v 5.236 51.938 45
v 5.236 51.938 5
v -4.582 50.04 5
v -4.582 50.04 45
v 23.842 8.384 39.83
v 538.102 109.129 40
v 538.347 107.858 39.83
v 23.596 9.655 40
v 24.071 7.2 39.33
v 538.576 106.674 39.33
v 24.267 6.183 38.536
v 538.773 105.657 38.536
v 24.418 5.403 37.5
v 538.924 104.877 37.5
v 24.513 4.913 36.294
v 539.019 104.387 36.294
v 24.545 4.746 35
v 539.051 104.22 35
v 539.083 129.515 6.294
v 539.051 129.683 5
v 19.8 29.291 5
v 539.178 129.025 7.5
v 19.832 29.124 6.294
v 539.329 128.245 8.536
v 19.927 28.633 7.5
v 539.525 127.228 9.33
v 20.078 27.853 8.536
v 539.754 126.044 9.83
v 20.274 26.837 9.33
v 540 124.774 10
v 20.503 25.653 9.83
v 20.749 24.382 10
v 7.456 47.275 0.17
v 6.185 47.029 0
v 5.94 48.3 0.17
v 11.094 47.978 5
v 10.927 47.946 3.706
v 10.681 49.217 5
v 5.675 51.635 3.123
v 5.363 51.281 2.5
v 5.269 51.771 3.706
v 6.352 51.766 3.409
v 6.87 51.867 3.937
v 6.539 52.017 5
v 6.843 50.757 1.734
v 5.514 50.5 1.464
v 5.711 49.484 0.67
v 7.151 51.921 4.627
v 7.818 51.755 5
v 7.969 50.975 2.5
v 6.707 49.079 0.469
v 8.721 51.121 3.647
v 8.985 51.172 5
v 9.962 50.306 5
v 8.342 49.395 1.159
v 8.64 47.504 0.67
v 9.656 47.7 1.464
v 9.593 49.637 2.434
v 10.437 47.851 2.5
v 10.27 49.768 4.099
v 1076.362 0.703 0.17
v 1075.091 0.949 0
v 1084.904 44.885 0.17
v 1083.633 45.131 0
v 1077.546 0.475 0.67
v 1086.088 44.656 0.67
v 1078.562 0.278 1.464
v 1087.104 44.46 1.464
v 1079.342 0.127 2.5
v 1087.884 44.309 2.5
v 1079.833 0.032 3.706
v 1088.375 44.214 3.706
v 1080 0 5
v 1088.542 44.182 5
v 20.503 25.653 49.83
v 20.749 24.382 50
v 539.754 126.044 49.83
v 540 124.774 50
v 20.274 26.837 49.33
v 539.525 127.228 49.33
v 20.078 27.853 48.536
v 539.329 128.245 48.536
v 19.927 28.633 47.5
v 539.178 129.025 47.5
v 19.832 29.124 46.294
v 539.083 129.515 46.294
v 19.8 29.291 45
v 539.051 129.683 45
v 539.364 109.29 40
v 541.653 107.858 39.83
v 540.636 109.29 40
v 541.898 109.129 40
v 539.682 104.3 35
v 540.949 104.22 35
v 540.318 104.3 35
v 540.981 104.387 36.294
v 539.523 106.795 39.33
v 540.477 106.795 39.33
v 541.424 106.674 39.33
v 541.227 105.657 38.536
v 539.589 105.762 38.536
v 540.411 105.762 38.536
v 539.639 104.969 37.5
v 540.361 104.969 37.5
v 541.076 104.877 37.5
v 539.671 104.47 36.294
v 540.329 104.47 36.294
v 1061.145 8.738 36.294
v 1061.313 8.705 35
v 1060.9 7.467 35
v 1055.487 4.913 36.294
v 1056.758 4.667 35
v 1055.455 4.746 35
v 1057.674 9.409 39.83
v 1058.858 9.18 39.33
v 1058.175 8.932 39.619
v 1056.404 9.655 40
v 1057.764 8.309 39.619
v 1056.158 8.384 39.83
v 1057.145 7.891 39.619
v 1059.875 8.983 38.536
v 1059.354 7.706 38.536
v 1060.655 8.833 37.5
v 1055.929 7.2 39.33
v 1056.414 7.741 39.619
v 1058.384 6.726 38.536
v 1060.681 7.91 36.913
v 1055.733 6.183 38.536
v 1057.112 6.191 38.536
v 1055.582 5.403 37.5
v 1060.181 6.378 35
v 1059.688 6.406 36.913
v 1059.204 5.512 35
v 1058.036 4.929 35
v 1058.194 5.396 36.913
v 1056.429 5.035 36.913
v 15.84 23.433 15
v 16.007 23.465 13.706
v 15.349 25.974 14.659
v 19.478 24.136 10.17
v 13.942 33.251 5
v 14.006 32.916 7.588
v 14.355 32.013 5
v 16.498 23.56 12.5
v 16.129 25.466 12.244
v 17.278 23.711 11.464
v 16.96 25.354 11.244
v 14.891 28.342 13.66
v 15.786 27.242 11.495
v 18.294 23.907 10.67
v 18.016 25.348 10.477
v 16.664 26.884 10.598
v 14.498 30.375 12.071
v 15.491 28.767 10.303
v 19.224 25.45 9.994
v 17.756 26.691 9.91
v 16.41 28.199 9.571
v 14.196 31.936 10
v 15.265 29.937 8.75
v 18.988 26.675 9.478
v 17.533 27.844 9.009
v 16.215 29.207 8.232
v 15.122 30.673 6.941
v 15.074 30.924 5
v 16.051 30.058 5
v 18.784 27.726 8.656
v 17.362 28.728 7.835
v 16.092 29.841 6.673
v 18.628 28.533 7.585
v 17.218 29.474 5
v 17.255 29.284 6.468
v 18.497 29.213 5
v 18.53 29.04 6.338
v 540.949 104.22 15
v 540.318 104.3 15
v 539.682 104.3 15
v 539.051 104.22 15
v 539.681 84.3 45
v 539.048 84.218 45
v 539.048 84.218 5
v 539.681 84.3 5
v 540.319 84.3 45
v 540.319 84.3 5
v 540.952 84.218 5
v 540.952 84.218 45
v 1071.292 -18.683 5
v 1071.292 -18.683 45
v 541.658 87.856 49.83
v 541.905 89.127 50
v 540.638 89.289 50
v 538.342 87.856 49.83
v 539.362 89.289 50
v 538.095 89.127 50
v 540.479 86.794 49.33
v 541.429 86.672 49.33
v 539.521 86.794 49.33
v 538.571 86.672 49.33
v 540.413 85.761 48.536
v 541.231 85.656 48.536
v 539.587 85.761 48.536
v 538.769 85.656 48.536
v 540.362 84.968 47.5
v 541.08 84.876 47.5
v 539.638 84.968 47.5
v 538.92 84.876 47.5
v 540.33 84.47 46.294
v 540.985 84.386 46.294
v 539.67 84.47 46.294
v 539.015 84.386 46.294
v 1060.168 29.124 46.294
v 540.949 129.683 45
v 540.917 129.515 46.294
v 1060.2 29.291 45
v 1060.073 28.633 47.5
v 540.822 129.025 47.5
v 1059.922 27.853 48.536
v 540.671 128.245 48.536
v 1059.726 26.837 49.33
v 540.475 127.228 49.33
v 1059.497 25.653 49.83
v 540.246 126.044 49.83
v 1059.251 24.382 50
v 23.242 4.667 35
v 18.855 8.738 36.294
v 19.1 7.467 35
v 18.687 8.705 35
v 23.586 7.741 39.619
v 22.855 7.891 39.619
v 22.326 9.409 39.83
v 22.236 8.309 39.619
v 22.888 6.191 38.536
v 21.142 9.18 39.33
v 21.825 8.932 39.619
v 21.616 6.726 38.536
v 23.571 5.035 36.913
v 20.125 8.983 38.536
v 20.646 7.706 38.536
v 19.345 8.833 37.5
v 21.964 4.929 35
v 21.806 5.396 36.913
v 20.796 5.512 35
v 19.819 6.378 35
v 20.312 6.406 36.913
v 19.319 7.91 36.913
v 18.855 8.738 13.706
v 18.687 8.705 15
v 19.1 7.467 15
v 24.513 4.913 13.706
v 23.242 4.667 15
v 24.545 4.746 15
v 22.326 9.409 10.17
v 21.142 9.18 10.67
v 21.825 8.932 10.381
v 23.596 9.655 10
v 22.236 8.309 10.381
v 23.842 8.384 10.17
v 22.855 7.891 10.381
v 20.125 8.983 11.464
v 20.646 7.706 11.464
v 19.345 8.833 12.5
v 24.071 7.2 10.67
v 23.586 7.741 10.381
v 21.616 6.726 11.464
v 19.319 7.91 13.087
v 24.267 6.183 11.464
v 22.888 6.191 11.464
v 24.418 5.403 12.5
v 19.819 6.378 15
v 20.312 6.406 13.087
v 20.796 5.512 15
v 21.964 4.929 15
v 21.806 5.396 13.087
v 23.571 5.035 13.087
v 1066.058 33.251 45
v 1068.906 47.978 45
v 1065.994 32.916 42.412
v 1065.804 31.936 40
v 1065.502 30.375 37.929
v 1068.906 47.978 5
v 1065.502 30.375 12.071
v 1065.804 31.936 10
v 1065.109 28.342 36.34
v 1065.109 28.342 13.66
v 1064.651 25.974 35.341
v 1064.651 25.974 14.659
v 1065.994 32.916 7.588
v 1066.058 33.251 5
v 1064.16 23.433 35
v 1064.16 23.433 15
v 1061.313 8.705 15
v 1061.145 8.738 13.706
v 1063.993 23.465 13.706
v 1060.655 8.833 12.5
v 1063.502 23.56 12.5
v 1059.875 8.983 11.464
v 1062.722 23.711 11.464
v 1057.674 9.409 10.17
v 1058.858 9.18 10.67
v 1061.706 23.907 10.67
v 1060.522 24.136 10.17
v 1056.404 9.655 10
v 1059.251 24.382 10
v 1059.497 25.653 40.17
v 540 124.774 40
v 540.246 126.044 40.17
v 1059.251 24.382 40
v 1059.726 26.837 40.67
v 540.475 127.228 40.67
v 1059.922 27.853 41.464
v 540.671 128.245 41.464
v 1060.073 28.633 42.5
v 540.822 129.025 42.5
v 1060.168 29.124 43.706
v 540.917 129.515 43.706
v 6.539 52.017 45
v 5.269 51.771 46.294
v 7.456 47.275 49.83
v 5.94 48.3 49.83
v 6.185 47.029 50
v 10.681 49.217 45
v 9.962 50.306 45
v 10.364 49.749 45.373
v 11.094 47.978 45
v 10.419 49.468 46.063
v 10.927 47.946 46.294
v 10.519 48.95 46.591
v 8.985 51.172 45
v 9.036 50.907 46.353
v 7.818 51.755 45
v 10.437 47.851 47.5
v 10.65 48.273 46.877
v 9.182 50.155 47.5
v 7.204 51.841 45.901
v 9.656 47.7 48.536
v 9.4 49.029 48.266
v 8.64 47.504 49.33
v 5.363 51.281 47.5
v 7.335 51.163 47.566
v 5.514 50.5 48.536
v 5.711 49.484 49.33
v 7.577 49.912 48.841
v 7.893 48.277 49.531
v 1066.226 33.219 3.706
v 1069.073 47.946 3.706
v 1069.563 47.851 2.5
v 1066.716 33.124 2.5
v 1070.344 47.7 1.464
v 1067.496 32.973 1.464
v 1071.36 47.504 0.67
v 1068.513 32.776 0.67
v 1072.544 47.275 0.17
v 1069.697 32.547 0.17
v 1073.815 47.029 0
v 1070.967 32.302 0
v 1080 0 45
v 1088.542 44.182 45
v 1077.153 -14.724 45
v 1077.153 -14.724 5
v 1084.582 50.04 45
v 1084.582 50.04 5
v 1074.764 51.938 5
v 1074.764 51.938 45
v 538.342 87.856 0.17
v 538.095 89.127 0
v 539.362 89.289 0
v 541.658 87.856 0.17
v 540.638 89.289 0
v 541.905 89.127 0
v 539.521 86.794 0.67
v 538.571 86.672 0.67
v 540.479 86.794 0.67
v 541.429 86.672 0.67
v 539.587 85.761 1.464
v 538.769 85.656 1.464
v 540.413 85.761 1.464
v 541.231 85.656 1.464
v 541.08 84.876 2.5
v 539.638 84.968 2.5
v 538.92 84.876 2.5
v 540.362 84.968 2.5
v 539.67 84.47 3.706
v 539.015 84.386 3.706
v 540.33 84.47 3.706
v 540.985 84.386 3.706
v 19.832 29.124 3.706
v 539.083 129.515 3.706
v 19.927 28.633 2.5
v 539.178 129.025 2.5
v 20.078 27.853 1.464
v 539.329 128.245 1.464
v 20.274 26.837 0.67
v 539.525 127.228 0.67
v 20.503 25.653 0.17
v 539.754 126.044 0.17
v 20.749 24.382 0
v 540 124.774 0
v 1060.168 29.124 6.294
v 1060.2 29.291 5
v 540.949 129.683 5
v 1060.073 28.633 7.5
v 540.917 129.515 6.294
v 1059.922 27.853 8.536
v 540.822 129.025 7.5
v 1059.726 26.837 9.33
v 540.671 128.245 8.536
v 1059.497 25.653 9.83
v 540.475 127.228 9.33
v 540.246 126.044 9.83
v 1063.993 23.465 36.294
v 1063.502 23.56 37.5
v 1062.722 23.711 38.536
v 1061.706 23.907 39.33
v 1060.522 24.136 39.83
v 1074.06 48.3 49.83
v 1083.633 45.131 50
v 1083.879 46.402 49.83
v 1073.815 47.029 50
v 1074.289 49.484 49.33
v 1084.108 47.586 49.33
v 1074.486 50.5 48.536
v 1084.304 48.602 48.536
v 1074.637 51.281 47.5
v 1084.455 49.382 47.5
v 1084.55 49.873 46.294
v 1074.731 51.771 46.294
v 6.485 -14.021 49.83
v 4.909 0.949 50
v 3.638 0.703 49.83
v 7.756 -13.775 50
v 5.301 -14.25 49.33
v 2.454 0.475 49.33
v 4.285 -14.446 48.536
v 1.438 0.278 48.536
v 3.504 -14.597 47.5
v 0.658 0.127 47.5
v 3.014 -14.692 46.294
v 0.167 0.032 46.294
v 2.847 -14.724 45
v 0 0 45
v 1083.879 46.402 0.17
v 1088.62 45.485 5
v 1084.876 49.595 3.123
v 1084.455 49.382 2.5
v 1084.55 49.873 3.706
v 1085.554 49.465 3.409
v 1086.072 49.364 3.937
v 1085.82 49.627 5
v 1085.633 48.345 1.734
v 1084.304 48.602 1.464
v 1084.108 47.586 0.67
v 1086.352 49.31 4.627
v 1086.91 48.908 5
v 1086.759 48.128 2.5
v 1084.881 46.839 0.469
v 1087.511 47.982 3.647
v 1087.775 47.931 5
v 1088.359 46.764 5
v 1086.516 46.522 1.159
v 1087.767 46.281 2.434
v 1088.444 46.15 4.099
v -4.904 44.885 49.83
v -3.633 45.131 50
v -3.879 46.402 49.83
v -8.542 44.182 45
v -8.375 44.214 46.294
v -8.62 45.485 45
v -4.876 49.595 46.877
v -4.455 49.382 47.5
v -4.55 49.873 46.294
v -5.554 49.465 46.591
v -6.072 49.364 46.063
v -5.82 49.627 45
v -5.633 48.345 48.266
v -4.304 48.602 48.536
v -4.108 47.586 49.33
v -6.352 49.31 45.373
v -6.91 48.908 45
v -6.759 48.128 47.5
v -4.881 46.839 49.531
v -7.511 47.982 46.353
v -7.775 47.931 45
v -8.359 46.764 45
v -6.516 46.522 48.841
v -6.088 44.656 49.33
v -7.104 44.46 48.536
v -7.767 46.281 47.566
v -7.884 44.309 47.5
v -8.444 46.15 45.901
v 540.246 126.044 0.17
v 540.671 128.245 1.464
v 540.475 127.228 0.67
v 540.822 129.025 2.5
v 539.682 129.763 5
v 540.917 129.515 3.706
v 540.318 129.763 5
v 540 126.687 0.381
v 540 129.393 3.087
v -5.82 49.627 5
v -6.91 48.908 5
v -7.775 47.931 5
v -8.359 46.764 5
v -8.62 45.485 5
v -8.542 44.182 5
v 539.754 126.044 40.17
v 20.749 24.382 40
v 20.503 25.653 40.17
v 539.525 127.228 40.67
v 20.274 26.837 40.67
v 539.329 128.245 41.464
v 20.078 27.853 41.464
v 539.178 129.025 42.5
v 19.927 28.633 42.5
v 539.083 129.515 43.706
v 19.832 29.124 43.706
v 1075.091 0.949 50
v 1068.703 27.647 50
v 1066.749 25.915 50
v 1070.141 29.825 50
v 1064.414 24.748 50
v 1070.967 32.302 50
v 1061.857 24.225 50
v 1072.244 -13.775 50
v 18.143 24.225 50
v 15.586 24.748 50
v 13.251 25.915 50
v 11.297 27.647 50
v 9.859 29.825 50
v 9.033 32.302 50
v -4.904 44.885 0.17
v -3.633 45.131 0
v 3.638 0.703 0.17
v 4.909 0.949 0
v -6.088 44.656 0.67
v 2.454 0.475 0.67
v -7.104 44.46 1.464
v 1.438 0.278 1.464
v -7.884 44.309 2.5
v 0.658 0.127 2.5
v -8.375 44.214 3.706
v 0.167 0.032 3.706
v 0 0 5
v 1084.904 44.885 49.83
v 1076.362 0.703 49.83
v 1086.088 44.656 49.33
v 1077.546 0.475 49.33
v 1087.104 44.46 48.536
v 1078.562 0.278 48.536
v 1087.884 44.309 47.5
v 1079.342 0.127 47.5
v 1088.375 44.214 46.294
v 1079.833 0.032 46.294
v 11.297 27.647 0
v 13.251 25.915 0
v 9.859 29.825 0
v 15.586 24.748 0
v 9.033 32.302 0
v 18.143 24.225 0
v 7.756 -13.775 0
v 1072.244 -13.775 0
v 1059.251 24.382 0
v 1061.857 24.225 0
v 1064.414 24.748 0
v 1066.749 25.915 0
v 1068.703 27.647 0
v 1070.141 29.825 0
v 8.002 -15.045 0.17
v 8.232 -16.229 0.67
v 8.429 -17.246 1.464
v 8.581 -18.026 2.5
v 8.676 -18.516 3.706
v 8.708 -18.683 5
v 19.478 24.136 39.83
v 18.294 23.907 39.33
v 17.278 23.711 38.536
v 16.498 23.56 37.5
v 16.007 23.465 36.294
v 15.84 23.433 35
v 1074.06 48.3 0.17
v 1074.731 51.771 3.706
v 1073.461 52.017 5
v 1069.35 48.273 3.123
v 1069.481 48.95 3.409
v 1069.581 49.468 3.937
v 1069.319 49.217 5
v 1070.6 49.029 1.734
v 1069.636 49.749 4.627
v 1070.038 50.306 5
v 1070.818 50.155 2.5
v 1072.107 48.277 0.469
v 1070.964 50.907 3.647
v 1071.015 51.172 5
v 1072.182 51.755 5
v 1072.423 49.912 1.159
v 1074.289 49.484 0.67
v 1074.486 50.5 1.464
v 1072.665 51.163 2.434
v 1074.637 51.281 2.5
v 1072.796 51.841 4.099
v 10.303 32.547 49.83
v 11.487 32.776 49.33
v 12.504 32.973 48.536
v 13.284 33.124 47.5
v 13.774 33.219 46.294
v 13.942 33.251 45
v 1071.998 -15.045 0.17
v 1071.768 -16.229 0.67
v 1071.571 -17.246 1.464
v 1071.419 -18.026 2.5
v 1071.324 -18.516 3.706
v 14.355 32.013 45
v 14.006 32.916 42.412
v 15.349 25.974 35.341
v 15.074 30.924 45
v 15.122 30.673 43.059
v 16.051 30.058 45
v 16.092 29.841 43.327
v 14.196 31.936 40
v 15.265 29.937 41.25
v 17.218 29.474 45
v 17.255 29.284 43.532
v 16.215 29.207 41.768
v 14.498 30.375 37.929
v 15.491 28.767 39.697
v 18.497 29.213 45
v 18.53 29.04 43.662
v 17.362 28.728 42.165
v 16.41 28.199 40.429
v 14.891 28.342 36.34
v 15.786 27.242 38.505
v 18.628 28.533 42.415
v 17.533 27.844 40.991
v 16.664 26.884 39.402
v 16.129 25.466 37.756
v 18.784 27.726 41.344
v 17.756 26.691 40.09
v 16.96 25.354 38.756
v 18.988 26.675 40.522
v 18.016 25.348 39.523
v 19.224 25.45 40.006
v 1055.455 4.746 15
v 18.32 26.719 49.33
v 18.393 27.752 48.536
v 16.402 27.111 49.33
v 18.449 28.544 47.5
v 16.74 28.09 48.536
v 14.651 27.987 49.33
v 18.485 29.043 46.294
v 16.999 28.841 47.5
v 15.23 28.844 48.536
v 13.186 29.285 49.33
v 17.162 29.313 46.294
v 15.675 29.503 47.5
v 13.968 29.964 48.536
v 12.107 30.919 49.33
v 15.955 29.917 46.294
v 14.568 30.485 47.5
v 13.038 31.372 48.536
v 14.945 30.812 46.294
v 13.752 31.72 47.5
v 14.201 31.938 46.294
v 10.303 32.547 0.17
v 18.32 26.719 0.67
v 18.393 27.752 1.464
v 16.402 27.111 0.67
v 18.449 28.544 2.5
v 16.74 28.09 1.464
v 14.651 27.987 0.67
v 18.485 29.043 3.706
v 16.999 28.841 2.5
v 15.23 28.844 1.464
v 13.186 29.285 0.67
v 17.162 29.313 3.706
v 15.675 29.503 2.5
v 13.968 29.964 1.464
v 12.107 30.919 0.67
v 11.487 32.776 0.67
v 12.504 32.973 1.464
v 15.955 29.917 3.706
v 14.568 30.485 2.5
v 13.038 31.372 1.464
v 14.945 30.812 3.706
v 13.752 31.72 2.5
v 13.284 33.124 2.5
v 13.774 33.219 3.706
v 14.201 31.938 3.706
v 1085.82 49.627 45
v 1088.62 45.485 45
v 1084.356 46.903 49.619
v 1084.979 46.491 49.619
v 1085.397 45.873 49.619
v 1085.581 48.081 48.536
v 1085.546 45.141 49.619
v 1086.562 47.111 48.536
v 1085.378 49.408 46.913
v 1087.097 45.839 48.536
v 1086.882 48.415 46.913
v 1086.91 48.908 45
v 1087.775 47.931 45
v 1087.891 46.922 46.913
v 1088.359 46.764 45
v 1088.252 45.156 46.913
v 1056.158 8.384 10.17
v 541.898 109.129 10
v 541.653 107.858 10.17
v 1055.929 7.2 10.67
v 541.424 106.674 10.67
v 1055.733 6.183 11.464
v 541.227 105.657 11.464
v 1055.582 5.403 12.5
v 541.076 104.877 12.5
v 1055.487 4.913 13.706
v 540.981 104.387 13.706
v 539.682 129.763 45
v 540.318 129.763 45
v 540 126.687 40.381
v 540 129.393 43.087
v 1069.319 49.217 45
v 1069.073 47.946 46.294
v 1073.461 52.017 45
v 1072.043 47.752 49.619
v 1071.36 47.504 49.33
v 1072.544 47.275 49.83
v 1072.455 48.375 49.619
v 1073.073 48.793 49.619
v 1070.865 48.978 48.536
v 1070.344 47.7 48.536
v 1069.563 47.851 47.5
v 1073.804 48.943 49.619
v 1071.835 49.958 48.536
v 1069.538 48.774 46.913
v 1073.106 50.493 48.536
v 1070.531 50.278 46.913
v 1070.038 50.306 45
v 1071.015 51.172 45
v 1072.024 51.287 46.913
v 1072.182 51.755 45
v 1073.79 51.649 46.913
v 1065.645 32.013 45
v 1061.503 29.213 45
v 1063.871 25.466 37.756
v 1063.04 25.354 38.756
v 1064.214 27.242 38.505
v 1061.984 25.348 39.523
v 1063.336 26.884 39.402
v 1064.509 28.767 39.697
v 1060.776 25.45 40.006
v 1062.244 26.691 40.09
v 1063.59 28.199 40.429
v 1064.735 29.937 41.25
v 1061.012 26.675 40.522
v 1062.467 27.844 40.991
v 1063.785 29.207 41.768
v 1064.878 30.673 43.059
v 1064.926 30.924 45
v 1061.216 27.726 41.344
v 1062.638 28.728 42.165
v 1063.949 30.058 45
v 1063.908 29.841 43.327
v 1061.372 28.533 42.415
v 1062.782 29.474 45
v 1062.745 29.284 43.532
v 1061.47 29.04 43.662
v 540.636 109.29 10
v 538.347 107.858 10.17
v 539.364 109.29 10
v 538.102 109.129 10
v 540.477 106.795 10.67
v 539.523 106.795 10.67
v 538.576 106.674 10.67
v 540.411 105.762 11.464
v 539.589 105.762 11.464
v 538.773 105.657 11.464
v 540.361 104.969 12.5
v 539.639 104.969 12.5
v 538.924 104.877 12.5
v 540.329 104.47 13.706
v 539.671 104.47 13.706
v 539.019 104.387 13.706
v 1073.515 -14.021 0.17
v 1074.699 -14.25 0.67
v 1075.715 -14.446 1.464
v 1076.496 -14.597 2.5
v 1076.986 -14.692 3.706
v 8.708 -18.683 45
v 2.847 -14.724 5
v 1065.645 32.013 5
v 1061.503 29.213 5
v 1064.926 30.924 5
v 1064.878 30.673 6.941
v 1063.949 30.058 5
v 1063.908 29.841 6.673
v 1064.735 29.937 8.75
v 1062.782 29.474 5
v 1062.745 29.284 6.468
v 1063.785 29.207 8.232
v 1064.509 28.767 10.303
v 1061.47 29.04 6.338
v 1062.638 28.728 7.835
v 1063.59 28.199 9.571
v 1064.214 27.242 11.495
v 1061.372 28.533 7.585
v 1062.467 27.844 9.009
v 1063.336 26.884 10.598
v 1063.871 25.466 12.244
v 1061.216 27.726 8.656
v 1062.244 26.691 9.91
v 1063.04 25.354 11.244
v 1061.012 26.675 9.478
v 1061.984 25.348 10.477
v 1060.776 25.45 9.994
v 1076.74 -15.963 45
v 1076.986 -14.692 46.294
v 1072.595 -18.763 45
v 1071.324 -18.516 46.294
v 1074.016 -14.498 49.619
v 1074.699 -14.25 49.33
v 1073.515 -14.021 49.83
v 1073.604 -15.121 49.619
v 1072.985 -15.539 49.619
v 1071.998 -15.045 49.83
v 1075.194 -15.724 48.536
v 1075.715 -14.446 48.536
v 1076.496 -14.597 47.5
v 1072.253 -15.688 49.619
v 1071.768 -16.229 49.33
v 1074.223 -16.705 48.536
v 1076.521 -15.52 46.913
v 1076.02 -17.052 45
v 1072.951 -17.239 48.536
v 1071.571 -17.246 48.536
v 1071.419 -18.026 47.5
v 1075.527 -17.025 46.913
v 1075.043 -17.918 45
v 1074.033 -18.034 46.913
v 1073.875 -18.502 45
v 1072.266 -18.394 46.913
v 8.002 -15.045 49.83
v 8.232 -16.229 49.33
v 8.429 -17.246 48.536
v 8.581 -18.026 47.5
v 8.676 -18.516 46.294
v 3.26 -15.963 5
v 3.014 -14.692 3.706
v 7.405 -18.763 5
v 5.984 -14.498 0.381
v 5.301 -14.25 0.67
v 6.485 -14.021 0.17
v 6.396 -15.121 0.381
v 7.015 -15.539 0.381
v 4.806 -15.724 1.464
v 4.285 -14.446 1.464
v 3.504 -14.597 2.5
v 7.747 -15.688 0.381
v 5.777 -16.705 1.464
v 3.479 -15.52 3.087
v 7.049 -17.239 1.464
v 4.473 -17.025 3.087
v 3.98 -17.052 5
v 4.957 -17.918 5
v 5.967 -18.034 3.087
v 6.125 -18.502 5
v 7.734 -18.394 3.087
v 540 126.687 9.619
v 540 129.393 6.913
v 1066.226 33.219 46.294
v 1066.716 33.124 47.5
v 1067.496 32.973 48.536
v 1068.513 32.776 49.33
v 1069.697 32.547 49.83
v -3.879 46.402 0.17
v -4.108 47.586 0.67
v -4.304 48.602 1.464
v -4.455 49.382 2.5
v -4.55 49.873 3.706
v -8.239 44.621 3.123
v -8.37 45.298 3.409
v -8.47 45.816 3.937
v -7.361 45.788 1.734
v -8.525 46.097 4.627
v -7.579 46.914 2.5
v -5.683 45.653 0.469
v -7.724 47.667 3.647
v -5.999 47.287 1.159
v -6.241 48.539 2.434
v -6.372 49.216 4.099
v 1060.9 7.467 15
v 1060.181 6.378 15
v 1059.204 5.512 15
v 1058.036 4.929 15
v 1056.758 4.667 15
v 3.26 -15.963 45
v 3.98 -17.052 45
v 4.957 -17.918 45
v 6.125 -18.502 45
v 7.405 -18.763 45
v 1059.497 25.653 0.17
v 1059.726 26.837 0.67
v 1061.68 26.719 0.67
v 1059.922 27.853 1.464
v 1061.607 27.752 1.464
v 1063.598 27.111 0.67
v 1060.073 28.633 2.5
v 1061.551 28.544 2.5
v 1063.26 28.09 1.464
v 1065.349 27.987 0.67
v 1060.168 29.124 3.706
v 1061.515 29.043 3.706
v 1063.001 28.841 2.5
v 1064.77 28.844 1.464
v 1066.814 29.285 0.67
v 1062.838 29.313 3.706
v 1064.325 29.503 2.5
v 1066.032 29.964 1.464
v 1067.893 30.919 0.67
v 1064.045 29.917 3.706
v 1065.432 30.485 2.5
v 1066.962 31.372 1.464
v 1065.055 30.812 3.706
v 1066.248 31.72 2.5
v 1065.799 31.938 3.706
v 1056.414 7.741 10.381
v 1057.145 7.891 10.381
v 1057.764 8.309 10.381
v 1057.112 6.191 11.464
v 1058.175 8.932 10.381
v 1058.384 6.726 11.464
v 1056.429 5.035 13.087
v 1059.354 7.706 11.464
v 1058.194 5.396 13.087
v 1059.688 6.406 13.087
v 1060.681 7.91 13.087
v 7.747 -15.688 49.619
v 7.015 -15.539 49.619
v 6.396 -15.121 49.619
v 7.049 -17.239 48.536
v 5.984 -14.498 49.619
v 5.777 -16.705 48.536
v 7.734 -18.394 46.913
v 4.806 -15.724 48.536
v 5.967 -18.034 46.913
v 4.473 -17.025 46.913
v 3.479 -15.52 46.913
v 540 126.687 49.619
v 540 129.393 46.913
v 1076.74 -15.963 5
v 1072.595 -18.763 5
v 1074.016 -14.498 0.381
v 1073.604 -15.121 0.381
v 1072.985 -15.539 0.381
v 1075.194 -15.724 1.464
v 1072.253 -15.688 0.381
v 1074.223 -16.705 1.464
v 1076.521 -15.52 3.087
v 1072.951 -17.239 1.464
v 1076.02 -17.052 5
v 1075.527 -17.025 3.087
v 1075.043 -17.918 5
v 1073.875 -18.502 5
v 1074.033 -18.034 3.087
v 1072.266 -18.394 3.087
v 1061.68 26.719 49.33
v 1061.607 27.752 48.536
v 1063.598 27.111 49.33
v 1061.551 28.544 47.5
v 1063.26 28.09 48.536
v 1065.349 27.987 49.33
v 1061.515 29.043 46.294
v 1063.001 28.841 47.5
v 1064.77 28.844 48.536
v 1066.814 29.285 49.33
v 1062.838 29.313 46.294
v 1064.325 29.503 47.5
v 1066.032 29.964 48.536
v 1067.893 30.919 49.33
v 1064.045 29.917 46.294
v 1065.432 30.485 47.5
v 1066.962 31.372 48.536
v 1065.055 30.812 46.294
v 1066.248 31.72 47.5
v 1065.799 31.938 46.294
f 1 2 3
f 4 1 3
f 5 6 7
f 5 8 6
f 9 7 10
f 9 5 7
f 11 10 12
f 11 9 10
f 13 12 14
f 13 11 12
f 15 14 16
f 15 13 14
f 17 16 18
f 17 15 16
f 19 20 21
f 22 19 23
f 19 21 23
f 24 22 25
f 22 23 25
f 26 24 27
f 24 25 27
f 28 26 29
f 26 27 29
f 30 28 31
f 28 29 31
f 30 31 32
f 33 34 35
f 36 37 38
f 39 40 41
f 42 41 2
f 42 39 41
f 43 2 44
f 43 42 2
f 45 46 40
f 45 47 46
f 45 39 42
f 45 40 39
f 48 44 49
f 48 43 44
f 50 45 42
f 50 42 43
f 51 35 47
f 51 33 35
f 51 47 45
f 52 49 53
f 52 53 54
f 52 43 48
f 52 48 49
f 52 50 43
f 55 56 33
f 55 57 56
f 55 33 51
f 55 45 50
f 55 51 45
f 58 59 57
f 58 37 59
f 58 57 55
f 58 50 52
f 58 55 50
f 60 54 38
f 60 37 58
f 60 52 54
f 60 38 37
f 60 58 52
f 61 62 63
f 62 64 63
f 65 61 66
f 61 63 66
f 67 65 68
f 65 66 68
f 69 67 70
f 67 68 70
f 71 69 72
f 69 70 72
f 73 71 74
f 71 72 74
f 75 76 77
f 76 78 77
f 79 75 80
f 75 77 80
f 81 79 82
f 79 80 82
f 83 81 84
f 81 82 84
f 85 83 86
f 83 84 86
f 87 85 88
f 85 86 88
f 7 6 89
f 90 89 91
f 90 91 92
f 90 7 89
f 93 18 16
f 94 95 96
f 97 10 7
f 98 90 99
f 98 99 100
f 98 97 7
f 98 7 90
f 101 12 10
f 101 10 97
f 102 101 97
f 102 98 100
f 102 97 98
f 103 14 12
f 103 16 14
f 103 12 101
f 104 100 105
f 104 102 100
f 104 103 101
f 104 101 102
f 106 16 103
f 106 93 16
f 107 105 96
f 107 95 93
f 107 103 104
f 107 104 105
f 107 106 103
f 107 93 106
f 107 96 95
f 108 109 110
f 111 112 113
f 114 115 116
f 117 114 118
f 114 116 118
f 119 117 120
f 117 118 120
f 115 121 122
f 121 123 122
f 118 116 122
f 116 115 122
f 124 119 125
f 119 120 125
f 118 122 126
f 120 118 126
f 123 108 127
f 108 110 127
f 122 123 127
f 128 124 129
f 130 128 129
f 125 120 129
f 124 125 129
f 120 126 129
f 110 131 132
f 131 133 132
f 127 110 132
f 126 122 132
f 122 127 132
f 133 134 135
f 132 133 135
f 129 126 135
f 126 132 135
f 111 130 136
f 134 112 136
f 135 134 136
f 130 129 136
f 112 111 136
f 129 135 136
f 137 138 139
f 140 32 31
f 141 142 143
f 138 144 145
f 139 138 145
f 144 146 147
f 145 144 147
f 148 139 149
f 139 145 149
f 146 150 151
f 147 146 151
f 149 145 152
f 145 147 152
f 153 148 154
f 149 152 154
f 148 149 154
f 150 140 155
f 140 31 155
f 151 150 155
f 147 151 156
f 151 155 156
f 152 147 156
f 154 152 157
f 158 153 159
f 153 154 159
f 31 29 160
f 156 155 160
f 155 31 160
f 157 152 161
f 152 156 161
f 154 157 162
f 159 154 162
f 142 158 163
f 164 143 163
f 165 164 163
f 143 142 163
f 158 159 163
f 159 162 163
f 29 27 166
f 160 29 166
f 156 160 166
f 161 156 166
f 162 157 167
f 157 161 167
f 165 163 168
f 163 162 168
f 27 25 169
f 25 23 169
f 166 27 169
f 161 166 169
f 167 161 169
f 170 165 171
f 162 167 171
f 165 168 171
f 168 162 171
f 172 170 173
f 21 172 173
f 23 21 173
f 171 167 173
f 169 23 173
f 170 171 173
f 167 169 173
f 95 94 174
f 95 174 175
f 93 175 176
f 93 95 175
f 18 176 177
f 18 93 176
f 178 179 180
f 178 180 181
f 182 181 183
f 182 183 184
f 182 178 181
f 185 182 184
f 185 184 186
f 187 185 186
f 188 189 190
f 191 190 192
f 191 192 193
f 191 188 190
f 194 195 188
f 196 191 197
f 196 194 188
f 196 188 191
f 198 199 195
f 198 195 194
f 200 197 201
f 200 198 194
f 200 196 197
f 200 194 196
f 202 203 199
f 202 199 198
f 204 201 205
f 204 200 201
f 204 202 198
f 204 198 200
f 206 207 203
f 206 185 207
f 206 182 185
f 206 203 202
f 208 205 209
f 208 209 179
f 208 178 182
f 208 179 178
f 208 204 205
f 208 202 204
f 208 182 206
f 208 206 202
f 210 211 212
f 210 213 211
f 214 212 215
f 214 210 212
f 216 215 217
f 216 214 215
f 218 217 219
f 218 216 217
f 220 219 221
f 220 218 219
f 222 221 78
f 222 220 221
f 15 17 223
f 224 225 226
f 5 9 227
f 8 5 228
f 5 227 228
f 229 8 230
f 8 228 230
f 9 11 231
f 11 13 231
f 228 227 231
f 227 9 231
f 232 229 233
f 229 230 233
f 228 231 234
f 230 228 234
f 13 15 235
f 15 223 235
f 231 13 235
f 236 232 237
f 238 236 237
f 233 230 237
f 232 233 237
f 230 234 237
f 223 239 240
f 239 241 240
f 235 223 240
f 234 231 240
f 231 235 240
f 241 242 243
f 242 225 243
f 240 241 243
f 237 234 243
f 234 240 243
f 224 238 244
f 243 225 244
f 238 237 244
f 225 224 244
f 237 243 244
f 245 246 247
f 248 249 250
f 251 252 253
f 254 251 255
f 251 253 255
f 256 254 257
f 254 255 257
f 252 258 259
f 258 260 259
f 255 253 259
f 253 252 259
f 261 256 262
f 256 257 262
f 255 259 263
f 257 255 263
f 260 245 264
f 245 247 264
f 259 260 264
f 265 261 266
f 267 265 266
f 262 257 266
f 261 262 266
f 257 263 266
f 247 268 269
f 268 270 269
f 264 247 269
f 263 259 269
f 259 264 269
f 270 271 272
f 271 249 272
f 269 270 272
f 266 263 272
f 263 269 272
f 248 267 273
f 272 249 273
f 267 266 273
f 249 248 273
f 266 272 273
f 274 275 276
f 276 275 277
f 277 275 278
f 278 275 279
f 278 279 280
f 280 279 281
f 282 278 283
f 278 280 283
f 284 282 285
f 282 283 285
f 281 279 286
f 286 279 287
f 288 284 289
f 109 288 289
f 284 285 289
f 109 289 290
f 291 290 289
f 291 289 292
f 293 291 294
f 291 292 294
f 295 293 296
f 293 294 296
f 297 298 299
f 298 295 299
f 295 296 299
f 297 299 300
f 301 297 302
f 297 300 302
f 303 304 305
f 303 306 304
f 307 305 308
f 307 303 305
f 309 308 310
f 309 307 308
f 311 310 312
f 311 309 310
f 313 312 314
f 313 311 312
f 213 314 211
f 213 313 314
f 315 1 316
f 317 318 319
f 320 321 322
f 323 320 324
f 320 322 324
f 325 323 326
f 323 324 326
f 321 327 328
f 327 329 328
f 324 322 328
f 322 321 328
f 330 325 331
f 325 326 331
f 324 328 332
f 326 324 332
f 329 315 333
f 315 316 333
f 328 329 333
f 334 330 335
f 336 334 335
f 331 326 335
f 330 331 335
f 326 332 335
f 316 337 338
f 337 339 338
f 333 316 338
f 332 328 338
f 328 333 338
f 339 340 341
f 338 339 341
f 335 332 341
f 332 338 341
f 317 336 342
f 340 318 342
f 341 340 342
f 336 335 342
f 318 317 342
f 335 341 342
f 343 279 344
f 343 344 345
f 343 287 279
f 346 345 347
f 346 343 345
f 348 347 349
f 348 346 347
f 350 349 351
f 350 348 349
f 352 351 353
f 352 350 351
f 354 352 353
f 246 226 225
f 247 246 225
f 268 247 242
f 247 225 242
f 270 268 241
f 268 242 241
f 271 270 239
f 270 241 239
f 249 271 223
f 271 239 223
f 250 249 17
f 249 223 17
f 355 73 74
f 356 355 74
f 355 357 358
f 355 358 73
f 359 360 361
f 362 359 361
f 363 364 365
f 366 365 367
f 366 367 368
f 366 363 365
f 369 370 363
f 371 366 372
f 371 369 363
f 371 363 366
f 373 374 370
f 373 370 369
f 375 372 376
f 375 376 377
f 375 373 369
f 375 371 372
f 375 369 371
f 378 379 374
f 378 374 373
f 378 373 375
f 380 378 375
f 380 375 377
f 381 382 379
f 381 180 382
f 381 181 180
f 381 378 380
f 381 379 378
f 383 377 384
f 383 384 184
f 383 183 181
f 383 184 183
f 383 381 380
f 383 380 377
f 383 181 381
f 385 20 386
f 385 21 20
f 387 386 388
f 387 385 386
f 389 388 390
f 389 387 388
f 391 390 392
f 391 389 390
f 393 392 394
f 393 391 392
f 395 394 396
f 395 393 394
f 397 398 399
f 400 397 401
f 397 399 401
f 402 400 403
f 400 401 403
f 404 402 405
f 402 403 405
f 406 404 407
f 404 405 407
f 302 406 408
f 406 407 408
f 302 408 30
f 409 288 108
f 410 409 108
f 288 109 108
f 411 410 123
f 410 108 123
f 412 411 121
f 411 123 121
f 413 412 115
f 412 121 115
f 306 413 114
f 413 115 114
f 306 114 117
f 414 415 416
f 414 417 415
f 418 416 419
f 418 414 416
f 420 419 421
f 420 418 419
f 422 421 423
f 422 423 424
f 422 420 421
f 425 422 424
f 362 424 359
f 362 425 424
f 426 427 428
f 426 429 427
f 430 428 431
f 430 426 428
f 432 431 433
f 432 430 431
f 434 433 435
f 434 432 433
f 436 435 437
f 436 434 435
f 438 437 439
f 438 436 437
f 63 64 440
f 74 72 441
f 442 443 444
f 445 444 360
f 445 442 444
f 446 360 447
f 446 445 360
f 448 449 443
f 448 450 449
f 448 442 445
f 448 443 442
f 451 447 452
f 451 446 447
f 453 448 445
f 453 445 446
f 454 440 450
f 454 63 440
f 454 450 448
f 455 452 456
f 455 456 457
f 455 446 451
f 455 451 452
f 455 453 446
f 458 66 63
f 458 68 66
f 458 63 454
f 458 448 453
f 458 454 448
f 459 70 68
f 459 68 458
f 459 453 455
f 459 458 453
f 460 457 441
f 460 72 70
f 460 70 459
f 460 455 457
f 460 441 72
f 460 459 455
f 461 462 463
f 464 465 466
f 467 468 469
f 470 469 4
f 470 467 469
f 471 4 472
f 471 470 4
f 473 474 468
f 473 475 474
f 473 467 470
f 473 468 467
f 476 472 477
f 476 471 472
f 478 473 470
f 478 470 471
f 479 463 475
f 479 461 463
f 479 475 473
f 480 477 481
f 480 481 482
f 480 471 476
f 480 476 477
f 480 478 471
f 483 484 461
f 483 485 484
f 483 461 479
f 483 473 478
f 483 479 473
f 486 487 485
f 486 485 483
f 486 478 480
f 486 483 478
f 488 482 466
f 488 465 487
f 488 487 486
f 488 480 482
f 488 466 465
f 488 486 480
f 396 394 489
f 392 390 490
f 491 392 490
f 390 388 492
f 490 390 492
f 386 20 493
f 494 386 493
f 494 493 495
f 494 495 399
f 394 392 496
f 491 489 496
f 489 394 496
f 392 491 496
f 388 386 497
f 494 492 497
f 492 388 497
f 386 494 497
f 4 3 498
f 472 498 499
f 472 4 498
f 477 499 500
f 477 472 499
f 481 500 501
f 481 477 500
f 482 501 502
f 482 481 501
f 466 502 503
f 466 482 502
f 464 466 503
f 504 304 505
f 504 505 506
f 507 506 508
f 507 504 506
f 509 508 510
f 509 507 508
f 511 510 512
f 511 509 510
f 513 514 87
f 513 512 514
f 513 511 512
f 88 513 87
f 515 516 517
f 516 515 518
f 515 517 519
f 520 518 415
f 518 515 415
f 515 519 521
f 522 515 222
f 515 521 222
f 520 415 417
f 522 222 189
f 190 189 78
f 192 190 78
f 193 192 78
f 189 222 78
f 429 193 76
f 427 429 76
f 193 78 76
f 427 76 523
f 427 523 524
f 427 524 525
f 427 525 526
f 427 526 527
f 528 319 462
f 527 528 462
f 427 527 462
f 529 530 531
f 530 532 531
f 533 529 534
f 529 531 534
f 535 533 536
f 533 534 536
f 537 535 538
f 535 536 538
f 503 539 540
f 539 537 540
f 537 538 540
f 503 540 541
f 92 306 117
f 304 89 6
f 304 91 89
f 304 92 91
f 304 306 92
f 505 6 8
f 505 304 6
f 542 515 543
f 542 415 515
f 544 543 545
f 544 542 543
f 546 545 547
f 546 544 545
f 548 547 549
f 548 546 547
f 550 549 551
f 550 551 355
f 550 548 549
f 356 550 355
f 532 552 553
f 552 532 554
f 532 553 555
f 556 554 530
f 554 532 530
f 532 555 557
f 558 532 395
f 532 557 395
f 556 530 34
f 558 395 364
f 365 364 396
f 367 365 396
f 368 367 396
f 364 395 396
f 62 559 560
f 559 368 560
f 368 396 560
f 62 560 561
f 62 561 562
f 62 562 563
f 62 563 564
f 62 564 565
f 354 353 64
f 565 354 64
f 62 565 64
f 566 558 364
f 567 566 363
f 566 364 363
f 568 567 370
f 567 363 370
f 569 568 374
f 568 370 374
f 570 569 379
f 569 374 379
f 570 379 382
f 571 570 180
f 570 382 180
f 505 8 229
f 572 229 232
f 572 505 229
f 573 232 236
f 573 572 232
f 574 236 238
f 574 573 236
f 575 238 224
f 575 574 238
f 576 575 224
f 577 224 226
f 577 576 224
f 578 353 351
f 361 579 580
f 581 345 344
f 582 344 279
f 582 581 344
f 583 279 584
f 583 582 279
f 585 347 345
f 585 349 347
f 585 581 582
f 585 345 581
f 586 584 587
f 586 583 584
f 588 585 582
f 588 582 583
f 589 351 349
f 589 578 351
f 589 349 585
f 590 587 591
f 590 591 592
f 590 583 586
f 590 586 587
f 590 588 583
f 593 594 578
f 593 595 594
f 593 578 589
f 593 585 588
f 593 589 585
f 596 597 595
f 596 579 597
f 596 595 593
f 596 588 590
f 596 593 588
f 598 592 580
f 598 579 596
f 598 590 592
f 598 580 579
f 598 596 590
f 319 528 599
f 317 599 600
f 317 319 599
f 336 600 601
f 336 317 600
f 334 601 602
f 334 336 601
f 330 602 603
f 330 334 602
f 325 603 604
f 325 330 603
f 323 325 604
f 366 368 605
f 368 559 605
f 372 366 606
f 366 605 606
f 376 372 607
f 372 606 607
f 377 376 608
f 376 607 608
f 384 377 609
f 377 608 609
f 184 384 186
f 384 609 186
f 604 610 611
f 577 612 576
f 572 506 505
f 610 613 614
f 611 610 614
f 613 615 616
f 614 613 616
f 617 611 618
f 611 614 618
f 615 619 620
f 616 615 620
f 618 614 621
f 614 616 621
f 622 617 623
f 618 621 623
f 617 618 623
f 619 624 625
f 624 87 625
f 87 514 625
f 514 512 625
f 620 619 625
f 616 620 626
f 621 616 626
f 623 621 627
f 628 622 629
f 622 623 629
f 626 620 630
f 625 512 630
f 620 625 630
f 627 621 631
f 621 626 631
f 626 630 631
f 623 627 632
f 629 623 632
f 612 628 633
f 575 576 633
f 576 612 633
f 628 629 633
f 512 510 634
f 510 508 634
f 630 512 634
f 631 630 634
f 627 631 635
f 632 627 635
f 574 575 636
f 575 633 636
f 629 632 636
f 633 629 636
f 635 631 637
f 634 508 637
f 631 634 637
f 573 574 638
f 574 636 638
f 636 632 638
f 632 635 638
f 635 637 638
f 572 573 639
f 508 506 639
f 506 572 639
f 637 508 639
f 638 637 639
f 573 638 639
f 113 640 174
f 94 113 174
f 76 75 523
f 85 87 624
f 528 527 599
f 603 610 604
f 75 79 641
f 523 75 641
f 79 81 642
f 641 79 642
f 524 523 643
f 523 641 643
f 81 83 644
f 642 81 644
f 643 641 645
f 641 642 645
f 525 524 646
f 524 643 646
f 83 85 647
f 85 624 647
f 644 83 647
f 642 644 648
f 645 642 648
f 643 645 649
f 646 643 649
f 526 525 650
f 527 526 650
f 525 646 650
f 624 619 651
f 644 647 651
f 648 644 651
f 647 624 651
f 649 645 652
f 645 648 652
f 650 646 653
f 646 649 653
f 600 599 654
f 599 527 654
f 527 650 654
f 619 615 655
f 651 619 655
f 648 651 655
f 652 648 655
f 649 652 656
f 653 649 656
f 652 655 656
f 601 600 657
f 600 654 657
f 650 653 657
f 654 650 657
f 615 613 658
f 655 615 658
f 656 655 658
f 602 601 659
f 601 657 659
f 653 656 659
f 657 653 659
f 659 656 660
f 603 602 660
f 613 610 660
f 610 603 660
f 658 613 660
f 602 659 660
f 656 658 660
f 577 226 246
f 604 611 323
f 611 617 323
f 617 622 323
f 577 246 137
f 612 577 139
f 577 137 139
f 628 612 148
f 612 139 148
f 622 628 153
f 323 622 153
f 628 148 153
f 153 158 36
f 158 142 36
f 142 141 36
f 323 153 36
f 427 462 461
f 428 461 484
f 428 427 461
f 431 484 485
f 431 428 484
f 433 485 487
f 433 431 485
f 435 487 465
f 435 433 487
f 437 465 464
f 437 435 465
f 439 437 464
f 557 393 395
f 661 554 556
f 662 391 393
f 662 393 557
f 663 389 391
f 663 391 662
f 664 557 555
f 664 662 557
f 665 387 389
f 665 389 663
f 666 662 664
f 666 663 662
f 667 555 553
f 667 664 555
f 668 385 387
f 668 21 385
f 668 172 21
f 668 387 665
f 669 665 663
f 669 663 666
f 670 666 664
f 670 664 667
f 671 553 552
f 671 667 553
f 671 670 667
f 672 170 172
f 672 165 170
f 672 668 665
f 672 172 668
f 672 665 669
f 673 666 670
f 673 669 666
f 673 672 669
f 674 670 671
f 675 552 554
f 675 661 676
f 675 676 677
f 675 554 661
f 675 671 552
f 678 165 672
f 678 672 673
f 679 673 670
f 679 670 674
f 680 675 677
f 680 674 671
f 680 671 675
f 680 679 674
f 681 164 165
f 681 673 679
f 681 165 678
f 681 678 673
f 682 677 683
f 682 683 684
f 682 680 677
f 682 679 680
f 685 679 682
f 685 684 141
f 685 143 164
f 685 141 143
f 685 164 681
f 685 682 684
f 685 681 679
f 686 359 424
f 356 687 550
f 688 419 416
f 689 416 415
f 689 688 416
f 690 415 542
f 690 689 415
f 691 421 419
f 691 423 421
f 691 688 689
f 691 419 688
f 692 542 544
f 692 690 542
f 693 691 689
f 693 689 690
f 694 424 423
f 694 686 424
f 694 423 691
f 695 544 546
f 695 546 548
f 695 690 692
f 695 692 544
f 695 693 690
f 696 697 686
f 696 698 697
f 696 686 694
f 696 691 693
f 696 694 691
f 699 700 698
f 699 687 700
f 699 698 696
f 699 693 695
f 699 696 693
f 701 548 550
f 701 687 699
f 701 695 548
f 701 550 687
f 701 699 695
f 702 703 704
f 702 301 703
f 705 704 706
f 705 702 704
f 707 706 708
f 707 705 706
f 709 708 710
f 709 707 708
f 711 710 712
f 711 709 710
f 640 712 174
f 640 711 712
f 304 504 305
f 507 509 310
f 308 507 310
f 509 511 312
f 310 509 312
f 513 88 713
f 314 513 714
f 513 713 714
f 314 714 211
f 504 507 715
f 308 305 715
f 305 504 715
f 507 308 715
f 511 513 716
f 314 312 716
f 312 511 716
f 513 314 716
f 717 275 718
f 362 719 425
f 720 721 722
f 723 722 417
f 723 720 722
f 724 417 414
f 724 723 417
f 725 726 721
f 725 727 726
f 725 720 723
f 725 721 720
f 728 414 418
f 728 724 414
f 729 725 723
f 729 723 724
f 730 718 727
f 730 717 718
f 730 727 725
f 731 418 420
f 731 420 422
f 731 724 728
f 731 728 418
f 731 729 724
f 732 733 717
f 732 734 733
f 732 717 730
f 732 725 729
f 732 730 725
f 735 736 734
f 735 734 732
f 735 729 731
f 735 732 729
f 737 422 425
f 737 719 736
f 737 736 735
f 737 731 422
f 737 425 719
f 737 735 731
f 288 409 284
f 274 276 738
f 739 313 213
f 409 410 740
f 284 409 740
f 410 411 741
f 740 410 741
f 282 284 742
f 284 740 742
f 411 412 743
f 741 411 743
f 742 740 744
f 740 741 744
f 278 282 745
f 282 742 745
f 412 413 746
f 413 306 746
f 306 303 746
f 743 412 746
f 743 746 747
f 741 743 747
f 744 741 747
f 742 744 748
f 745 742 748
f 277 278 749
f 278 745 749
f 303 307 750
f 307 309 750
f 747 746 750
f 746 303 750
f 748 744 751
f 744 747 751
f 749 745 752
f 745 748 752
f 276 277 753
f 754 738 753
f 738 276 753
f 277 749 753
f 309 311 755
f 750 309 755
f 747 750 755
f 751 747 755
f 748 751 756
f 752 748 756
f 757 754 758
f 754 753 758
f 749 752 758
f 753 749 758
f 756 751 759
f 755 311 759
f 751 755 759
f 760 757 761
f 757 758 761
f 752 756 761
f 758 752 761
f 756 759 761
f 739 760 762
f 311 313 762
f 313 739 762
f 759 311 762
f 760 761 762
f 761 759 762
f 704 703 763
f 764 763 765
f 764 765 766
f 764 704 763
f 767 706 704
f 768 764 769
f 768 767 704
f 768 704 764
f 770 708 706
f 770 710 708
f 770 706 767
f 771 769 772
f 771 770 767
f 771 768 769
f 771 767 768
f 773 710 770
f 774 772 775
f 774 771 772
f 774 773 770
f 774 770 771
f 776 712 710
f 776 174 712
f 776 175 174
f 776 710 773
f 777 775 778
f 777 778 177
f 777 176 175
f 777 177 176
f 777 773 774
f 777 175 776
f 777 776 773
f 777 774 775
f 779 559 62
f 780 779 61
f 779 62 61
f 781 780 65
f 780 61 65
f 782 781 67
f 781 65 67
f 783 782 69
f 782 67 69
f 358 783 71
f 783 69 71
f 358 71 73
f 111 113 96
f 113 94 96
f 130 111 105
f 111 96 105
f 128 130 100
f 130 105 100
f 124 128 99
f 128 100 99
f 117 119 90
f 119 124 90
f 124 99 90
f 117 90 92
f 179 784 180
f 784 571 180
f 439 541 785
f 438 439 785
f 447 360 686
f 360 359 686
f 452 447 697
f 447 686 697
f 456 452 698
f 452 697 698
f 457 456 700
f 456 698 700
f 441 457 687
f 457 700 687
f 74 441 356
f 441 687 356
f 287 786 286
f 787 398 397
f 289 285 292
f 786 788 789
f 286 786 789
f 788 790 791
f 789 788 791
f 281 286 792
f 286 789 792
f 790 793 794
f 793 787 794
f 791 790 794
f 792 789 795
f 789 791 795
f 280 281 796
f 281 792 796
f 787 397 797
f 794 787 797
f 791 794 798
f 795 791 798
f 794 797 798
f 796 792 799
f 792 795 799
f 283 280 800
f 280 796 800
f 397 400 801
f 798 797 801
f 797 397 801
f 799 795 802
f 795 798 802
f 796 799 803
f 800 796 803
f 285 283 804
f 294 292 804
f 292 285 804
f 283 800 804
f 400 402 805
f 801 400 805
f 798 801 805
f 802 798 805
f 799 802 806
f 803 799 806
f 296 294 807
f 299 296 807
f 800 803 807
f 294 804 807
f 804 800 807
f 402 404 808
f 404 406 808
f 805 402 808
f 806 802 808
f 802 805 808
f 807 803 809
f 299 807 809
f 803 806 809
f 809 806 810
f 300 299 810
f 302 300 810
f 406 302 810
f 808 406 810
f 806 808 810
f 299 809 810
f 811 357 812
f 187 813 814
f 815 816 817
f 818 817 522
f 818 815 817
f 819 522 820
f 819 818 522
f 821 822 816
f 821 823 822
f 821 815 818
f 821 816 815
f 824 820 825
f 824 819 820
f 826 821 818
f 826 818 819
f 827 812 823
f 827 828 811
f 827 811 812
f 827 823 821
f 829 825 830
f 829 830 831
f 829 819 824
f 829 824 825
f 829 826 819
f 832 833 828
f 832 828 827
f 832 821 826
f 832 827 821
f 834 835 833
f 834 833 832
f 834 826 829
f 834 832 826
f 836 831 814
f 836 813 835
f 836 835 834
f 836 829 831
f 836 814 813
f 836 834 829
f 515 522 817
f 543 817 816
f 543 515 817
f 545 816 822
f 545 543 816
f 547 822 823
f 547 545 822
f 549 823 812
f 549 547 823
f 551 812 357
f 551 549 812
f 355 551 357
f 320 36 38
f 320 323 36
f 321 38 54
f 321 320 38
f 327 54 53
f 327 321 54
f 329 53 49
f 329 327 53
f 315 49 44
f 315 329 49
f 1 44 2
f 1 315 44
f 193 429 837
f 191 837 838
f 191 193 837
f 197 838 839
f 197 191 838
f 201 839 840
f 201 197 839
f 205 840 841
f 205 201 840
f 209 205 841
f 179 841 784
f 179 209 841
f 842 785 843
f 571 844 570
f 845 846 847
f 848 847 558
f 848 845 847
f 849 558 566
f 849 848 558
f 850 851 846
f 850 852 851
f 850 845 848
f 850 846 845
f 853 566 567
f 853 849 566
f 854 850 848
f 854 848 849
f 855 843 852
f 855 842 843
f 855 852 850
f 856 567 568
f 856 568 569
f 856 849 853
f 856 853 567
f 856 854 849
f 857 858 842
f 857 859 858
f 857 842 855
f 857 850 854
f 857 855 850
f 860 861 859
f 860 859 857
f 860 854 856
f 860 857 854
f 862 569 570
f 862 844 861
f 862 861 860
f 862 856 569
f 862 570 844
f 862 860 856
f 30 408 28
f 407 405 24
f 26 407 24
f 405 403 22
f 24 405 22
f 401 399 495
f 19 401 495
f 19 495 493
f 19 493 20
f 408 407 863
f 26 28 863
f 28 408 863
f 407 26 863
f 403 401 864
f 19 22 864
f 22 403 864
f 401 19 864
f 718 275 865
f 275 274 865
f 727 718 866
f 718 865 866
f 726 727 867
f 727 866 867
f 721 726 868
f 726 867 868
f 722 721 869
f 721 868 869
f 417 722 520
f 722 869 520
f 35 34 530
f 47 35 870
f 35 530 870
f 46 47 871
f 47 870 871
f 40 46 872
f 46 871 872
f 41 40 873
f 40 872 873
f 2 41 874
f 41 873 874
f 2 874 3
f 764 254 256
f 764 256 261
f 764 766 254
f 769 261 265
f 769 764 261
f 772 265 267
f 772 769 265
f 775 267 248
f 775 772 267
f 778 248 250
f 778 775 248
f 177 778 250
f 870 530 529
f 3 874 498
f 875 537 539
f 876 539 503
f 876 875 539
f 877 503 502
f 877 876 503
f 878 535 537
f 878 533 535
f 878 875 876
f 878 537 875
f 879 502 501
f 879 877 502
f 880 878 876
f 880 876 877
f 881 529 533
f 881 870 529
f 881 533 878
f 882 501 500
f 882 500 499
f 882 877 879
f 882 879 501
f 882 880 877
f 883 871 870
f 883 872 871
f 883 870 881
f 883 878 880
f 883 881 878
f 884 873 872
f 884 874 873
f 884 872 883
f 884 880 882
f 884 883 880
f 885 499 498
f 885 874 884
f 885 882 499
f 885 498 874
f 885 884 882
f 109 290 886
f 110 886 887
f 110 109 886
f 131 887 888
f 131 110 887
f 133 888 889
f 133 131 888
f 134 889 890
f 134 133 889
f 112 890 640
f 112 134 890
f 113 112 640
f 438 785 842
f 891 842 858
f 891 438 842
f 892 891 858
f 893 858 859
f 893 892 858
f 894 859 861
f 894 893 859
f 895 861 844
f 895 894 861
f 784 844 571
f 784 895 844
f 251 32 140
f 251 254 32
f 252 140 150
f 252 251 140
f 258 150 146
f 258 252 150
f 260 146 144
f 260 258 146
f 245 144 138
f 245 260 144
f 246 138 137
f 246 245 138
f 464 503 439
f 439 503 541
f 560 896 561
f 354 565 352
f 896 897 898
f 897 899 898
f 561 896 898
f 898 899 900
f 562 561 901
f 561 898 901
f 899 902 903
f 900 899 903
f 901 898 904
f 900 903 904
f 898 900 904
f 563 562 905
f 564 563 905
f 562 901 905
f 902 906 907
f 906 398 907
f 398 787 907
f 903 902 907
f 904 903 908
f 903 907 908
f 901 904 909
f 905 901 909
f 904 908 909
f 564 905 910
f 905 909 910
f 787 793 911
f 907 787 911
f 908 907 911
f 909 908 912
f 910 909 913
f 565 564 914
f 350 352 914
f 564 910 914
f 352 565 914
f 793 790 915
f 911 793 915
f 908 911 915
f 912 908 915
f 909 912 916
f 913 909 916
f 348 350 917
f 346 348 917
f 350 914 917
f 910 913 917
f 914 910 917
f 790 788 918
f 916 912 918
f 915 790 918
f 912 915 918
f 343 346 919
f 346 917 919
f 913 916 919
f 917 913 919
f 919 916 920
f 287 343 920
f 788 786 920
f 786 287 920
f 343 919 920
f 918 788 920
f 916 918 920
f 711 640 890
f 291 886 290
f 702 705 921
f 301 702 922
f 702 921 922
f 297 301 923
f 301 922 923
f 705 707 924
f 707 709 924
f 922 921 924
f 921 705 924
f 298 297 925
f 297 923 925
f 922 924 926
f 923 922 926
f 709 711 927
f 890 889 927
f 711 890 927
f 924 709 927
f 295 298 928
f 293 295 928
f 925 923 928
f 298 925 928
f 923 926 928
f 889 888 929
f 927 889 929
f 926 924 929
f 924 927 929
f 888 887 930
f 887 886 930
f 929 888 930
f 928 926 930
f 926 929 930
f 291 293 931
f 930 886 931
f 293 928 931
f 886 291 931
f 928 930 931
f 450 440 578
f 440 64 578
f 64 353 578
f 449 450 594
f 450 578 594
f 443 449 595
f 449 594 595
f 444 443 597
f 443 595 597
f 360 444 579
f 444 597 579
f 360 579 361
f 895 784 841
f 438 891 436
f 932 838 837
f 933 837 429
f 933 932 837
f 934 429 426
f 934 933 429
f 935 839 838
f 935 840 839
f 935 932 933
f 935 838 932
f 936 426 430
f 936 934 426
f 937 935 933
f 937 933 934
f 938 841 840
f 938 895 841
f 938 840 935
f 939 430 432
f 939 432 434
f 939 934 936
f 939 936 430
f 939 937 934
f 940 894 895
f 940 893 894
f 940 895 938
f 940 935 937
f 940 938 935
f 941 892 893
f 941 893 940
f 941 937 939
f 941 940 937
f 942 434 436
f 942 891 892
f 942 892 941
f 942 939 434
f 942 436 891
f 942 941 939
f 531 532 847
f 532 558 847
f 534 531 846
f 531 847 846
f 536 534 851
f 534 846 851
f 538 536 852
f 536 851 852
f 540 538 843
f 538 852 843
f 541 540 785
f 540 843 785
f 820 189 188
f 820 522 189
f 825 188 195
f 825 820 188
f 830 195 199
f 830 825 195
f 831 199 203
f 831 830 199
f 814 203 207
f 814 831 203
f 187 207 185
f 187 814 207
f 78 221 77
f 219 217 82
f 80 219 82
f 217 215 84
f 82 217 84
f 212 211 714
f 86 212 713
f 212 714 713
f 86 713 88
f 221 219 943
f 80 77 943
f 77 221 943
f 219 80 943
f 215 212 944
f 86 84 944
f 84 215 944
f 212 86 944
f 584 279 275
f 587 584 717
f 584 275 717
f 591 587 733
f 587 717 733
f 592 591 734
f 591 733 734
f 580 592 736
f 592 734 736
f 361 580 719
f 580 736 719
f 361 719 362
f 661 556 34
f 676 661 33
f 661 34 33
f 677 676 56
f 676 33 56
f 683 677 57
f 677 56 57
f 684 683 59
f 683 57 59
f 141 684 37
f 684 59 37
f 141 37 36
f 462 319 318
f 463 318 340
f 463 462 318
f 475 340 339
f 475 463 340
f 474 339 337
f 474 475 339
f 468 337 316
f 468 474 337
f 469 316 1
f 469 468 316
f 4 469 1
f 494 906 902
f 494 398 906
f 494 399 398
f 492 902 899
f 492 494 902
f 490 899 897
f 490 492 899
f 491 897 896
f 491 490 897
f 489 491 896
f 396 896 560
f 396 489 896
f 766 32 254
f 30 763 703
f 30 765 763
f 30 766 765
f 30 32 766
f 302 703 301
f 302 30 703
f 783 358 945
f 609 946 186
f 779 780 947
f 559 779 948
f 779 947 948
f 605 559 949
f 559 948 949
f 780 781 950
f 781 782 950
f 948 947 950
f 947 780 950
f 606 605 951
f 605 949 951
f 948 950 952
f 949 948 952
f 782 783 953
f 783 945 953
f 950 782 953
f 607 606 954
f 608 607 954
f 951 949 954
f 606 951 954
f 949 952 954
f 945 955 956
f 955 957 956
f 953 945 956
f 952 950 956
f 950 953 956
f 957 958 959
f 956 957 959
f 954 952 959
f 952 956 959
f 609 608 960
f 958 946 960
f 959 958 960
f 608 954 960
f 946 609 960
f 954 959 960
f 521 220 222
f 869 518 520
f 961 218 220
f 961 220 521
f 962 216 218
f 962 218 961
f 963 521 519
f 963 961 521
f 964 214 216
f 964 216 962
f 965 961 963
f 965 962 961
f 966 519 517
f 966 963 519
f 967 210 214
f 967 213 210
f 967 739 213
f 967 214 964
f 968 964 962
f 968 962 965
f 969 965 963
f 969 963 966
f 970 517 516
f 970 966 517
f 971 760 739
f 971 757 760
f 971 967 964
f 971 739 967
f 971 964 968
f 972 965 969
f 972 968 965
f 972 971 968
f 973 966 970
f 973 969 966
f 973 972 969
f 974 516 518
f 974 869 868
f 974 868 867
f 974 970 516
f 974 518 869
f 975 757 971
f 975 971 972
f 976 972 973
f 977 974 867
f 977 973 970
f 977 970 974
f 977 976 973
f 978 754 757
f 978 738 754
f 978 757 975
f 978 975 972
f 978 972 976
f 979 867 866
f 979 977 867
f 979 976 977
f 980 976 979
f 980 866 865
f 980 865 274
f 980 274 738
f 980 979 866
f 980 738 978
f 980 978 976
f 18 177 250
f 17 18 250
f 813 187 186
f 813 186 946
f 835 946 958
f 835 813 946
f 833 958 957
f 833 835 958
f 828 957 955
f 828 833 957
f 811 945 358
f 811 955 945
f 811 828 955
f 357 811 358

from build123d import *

# Parameters (mm, degrees)
DODANIE_WYCI_GNI_CIE1_DEPTH = 50
DODANIE_WYCI_GNI_CIE4_DEPTH = 10
DODANIE_WYCI_GNI_CIE5_DEPTH = 10
ZAOKR_GLENIE1_R             = 5


with BuildPart() as part:
    # Szkic1 → Dodanie-wyciągnięcie1 (new body)
    with BuildSketch(Plane.XY):
        Polygon((1060.363636364, 3.796475094), (540, 104.403065089), (19.636363636, 3.796475094), (10.145175901, 52.887384185), (-9.491187735, 49.090909091), (0, 0), (3.796475094, -19.636363636), (540, 84.403065089), (1076.203524906, -19.636363636), (1080, 0), (1089.491187735, 49.090909091), (1069.854824099, 52.887384185), align=None)
    extrude(amount=DODANIE_WYCI_GNI_CIE1_DEPTH)

    # Szkic4 → Dodanie-wyciągnięcie4 (add)
    with BuildSketch(Plane.XY.offset(50)):
        Polygon((19.636363636, 3.796475094), (14.890769769, 28.34192964), (540, 129.866028052), (1065.109230231, 28.34192964), (1060.363636364, 3.796475094), (540, 104.403065089), align=None)
    extrude(amount=-DODANIE_WYCI_GNI_CIE4_DEPTH)

    # Szkic5 → Dodanie-wyciągnięcie5 (add)
    with BuildSketch(Plane(origin=(0, 0, 0), x_dir=(-1, 0, 0), z_dir=(0, 0, -1))):
        Polygon((-1060.363636364, 3.796475094), (-1065.109230231, 28.34192964), (-540, 129.866028052), (-14.890769769, 28.34192964), (-19.636363636, 3.796475094), (-540, 104.403065089), align=None)
    extrude(amount=-DODANIE_WYCI_GNI_CIE5_DEPTH)

    # Zaokrąglenie1
    zaokr_glenie1_edges = [part.edges().sort_by_distance(p)[0] for p in [
        (271.898237547, 32.383350726, 50),
        (1082.847356321, 14.727272727, 0),
        (1079.673005917, 50.989146638, 0),
        (1067.482027165, 40.614656912, 0),
        (12.517972835, 40.614656912, 0),
        (-2.847356321, 14.727272727, 50),
        (0.326994083, 50.989146638, 0),
        (-2.847356321, 14.727272727, 0),
        (271.898237547, 32.383350726, 0),
        (808.101762453, 32.383350726, 0),
        (0.326994083, 50.989146638, 50),
        (1089.491187735, 49.090909091, 25),
        (1069.854824099, 52.887384185, 25),
        (10.145175901, 52.887384185, 25),
        (-9.491187735, 49.090909091, 25),
        (3.796475094, -19.636363636, 25),
        (540, 84.403065089, 25),
        (1076.203524906, -19.636363636, 25),
        (12.517972835, 40.614656912, 50),
        (1067.482027165, 40.614656912, 50),
        (1079.673005917, 50.989146638, 50),
        (19.636363636, 3.796475094, 25),
        (540, 104.403065089, 25),
        (1060.363636364, 3.796475094, 25),
        (279.818181818, 54.099770092, 40),
        (17.263566703, 16.069202367, 40),
        (1082.847356321, 14.727272727, 50),
        (277.445384884, 79.103978846, 40),
        (14.890769769, 28.34192964, 45),
        (802.554615116, 79.103978846, 40),
        (540, 129.866028052, 45),
        (1062.736433297, 16.069202367, 40),
        (1065.109230231, 28.34192964, 45),
        (800.181818182, 54.099770092, 40),
        (802.554615116, 79.103978846, 50),
        (277.445384884, 79.103978846, 50),
        (800.181818182, 54.099770092, 10),
        (1062.736433297, 16.069202367, 10),
        (802.554615116, 79.103978846, 10),
        (1065.109230231, 28.34192964, 5),
        (277.445384884, 79.103978846, 10),
        (540, 129.866028052, 5),
        (17.263566703, 16.069202367, 10),
        (14.890769769, 28.34192964, 5),
        (279.818181818, 54.099770092, 10),
        (277.445384884, 79.103978846, 0),
        (802.554615116, 79.103978846, 0),
        (808.101762453, 32.383350726, 50),
    ]]
    fillet(zaokr_glenie1_edges, radius=ZAOKR_GLENIE1_R - 0.0001)  # a hair under: the kernel refuses the full size


solid = part.part
